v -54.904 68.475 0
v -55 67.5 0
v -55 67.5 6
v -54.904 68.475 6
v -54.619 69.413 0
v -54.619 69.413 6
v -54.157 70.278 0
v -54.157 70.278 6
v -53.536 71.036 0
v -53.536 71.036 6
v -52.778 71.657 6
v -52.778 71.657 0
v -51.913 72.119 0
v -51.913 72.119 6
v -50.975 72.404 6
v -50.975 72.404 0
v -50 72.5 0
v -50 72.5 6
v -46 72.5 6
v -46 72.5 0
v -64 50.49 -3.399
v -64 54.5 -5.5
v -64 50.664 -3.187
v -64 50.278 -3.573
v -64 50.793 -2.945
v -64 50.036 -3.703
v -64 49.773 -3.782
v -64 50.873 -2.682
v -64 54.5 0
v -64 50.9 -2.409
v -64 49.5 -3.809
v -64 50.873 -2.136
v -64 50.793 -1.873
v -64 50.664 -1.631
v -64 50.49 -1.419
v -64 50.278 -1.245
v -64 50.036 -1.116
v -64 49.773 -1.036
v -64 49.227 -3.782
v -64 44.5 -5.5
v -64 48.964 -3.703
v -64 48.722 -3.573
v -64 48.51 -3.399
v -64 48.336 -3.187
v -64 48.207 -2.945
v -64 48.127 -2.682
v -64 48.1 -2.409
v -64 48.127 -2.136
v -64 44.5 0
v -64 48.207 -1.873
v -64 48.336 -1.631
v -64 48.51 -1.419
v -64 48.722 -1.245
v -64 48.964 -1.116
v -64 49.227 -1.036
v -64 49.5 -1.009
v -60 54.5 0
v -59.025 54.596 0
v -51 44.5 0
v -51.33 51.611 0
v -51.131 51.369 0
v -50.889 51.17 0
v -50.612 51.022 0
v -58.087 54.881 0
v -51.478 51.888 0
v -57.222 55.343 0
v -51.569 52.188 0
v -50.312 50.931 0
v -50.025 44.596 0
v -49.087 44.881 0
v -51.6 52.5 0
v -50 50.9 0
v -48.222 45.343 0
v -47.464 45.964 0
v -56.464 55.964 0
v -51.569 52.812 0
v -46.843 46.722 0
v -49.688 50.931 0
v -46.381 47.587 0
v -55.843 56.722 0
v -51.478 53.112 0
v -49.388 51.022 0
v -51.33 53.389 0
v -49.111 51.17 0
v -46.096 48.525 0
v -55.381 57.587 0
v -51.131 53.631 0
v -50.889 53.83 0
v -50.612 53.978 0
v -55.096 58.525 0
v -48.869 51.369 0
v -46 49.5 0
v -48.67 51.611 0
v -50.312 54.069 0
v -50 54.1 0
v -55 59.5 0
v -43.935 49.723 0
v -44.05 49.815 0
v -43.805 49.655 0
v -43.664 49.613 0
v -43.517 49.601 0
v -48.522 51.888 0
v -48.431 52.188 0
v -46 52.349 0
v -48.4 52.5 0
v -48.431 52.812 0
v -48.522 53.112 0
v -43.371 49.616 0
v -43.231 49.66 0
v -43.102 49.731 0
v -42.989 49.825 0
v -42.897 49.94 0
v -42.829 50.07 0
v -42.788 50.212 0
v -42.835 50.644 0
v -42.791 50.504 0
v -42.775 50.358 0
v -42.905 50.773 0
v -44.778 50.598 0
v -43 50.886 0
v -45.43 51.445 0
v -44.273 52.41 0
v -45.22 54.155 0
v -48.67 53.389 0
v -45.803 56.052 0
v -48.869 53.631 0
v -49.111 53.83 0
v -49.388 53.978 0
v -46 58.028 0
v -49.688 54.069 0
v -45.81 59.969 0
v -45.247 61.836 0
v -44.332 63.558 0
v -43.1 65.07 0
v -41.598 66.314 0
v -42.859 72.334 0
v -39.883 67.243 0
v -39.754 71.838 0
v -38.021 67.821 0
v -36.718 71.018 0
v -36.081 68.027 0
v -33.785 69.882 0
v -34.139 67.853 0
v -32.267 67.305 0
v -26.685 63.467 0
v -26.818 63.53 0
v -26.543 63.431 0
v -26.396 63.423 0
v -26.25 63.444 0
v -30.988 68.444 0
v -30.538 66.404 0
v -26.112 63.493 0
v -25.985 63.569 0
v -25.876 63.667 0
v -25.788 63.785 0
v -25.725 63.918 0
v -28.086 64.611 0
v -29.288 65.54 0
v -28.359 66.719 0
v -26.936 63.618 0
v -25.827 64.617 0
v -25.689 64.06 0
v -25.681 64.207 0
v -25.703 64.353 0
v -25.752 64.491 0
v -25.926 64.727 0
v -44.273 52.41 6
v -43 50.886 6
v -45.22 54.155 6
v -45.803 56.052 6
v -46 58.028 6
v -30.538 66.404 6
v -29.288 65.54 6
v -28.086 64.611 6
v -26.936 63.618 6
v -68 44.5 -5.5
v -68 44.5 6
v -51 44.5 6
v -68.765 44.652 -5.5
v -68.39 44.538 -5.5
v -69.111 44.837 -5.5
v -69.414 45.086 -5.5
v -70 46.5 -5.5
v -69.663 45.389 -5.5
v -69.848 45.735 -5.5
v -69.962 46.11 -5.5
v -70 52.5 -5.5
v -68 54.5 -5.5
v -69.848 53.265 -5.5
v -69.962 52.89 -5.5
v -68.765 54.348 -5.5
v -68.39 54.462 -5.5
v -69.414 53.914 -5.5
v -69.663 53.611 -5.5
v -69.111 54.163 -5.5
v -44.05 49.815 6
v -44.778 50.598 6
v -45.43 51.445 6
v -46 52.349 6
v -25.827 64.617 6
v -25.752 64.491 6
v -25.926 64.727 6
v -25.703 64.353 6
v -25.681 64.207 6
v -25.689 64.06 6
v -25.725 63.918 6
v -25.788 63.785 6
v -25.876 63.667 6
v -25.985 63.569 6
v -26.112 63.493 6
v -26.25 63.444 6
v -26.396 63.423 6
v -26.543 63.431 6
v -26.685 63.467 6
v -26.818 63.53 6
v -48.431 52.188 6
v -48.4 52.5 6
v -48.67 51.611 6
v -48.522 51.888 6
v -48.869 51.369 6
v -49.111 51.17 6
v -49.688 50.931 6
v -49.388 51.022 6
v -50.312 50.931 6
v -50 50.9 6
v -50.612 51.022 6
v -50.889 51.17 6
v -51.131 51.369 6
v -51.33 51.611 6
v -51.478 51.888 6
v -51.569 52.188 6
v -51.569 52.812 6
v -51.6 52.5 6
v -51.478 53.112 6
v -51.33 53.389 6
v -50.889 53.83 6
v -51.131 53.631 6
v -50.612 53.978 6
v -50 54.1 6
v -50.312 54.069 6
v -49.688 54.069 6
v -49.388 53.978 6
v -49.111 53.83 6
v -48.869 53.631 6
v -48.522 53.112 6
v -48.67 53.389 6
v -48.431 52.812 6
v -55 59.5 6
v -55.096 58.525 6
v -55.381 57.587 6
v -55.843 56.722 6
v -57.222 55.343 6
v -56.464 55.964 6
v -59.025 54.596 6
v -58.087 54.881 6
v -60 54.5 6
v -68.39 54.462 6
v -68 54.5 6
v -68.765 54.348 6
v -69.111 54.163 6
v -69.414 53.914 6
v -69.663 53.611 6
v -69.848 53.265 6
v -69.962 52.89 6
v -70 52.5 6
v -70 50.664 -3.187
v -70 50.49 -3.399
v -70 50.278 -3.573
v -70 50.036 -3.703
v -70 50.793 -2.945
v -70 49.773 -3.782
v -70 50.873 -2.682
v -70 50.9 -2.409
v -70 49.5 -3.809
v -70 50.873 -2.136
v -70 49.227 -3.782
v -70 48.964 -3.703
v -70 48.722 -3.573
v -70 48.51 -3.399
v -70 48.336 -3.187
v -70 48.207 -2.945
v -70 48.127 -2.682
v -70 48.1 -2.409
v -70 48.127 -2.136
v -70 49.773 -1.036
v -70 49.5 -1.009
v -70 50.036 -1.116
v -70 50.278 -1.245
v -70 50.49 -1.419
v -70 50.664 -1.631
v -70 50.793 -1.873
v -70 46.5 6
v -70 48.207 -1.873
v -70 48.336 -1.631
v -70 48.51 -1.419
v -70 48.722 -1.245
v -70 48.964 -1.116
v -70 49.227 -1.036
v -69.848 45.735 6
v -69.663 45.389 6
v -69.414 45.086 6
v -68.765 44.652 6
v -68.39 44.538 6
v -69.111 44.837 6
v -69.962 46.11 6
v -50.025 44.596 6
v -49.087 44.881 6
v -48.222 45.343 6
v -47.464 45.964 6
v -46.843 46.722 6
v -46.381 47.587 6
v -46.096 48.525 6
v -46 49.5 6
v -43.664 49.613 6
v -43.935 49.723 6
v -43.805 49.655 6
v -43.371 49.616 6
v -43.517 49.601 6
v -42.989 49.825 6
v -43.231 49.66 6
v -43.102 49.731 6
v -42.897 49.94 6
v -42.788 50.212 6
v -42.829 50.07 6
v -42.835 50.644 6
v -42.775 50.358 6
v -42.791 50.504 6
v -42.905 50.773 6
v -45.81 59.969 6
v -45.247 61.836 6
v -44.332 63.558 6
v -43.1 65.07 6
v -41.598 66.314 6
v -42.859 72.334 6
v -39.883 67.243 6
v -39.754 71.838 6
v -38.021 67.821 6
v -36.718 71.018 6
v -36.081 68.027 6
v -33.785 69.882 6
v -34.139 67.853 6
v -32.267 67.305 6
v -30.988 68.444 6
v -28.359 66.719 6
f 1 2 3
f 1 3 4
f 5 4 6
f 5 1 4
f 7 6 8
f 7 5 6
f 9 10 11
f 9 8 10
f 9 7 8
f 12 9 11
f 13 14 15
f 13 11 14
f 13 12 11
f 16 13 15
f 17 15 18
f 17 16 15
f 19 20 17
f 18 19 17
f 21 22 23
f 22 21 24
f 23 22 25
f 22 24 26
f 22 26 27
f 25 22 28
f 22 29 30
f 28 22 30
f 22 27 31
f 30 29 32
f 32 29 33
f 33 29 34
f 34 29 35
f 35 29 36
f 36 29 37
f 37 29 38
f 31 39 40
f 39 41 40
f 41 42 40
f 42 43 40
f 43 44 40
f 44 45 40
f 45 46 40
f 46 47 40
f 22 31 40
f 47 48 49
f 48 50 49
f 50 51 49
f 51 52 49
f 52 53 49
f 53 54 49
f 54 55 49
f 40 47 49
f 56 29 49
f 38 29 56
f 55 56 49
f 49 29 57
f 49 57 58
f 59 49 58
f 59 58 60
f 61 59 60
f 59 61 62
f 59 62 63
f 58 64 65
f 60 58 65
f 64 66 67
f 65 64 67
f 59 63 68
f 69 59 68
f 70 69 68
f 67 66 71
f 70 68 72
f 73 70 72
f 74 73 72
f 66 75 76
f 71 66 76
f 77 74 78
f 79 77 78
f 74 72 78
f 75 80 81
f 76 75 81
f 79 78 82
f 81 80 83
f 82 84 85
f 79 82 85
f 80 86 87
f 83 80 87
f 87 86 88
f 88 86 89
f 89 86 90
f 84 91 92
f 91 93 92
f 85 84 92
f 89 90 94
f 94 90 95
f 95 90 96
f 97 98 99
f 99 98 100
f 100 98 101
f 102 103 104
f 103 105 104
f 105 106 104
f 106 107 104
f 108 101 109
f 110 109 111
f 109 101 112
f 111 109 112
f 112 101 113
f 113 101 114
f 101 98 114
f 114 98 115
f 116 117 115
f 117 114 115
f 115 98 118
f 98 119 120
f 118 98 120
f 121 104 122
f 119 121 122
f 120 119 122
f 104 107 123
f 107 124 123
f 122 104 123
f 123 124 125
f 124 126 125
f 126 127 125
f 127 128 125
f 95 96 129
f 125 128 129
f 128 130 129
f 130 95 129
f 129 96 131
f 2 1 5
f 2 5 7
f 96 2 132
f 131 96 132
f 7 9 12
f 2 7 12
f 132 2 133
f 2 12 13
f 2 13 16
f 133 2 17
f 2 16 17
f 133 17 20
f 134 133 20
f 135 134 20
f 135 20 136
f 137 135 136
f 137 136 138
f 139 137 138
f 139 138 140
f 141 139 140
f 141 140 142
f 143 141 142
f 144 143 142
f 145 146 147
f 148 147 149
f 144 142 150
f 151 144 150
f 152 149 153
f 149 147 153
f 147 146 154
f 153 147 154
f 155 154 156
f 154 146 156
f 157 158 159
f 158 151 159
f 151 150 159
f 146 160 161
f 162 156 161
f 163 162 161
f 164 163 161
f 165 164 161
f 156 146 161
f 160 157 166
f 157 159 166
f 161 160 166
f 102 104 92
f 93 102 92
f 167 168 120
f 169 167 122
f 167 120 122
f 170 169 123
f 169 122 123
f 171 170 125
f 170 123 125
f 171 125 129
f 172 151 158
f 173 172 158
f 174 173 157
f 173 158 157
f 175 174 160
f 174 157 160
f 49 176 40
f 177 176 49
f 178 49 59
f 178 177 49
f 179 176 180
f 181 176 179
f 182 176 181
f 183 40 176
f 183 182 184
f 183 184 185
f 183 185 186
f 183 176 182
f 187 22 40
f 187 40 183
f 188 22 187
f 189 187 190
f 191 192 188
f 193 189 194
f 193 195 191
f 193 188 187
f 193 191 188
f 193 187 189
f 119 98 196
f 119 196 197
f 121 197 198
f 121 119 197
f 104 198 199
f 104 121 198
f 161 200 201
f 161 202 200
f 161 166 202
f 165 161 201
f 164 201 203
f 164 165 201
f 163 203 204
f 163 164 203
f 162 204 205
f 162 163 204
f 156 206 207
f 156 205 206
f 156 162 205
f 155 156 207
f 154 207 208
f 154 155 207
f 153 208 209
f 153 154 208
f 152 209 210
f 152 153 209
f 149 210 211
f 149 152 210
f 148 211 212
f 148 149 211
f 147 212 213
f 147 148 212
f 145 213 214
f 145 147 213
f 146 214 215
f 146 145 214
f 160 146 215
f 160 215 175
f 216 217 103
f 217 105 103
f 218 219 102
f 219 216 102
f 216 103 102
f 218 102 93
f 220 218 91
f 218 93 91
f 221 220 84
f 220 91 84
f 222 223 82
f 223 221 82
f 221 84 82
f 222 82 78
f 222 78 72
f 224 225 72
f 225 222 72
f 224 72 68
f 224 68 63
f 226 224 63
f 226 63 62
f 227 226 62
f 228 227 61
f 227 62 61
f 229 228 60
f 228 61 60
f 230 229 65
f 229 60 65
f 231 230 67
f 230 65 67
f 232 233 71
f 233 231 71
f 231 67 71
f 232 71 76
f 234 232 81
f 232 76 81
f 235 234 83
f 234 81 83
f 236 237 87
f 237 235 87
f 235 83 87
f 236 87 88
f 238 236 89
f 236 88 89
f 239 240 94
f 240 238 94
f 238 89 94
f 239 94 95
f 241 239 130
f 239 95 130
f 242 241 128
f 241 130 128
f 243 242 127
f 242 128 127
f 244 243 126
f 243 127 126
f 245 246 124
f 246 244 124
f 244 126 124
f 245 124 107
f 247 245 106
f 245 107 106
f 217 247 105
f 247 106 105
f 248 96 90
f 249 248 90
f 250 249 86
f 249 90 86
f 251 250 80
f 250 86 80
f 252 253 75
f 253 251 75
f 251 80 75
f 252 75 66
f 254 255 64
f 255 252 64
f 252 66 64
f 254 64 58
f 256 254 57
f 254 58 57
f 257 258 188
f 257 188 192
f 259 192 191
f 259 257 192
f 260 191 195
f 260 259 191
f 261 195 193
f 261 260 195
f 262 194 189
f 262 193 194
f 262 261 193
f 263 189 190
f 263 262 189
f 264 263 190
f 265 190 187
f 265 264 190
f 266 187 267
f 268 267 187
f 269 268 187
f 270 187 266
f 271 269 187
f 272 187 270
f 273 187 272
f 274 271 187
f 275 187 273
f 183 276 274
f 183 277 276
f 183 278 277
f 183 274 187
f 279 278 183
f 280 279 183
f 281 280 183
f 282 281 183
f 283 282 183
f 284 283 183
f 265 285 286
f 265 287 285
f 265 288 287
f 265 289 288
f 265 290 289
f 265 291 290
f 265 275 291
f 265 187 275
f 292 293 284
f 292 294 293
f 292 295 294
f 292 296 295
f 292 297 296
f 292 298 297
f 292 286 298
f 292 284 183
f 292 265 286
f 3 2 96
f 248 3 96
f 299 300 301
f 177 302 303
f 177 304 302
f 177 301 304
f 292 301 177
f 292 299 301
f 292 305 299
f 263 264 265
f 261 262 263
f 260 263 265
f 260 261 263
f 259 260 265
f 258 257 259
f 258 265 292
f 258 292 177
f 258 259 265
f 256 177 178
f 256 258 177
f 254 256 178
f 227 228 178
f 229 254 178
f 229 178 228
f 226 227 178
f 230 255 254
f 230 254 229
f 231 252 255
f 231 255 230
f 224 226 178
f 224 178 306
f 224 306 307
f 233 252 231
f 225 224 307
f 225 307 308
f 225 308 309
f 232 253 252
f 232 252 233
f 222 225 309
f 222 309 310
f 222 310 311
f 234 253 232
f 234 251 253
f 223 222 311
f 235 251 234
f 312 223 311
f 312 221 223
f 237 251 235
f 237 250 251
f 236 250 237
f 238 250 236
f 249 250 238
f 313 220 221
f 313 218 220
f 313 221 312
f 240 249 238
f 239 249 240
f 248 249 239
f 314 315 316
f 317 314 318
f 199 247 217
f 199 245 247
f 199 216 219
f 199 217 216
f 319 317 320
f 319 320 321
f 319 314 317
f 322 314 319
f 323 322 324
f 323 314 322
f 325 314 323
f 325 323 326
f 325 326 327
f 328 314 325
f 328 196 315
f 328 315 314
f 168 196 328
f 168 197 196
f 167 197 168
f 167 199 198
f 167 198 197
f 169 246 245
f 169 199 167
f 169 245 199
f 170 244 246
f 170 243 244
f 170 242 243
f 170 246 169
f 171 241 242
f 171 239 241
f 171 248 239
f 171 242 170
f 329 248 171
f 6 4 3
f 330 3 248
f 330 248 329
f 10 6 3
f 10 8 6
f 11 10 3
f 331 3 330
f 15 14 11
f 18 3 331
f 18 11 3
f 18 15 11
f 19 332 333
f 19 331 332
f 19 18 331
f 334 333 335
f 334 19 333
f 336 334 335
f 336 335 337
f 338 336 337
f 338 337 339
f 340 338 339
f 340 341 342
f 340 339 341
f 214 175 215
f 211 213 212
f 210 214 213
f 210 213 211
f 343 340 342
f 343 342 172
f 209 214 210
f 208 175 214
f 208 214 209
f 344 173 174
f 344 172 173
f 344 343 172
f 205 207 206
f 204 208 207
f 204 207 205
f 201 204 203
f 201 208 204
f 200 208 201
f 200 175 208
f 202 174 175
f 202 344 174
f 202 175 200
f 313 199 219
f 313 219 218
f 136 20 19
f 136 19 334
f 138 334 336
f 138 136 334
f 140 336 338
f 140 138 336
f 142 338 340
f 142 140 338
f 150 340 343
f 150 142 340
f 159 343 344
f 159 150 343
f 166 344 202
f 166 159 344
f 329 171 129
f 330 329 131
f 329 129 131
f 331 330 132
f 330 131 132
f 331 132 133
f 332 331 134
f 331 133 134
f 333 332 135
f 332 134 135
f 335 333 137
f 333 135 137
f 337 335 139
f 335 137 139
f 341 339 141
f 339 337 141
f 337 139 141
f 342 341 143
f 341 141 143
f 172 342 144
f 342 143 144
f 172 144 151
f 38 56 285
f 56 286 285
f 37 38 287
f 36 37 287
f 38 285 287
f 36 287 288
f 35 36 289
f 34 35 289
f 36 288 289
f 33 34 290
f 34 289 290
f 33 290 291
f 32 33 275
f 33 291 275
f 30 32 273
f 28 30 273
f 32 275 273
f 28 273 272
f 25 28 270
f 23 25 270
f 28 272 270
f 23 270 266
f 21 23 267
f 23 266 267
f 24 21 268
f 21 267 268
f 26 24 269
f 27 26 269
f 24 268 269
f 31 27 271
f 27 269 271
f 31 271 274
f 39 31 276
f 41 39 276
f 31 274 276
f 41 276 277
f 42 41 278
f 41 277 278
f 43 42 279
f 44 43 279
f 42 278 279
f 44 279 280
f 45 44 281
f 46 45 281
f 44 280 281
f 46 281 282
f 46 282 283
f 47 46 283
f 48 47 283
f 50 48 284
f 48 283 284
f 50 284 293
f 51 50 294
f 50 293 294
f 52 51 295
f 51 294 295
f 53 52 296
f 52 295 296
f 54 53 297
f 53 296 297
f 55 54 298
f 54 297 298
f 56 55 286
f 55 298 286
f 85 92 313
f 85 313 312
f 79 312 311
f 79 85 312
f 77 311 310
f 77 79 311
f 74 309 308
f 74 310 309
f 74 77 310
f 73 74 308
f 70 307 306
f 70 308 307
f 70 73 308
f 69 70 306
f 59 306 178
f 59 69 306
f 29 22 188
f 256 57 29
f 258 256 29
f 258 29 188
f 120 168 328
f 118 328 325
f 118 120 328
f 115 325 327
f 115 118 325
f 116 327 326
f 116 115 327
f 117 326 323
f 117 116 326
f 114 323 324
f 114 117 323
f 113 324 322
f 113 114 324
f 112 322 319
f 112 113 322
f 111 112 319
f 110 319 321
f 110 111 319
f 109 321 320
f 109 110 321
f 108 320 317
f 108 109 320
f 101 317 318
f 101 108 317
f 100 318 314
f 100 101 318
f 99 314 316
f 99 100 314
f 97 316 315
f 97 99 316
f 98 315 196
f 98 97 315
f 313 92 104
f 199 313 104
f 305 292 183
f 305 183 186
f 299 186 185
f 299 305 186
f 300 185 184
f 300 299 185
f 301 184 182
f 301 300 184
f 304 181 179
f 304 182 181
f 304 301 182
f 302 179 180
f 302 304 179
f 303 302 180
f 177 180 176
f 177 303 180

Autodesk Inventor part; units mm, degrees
ref_plane "YZ Plane" through (0, 0, 0) normal (1, 0, 0) x (0, 1, 0)
ref_plane "XZ Plane" through (0, 0, 0) normal (0, 1, 0) x (-1, 0, 0)
ref_plane "XY Plane" through (0, 0, 0) normal (0, 0, 1) x (1, 0, 0)
ref_plane "Arbeitsebene1" through (0, 0, 0) normal (0, 0, 1) x (1, 0, 0)
sketch "Skizze1" plane through (0, 0, 0) normal (0, 0, 1) x (1, 0, 0)
  line L0 (-43.5249, 65.0249) -> (-30, 65.0249) projected
  line L1 (-43.5249, -65.0249) -> (-43.5249, 65.0249) projected
  circle A0 centre (-50, 52.5) radius 1.4 projected
  line L2 (-46, 72.5) -> (-50, 72.5)
  line L3 (-55, 67.5) -> (-55, 59.5)
  line L4 (-55, 44.5) -> (-51, 44.5)
  line L5 (-46, 49.5) -> (-46, 58.0276)
  line L6 (-55, 44.5) -> (-70, 44.5)
  line L7 (-70, 44.5) -> (-70, 54.5)
  line L8 (-70, 54.5) -> (-60, 54.5)
  line L9 (-55, 54.5) -> (-55, 44.5)
  circle A1 centre (-50, 52.5) radius 1.6
  arc A2 (-25.9255, 64.7266) -> (-46, 72.5) centre (-46, 42.6923) ccw
  arc A3 (-26.9357, 63.6178) -> (-30.5378, 66.404) centre (-46, 42.6923) ccw
  arc A4 (-30.5378, 66.404) -> (-46, 58.0276) centre (-36, 58.0276) ccw
  arc A5 (-26.9357, 63.6178) -> (-25.9255, 64.7266) centre (-26.4306, 64.1722) ccw
  arc A6 (-46, 58.0276) -> (-42.9999, 50.8861) centre (-36, 58.0276) ccw
  arc A7 (-46, 52.3487) -> (-44.0499, 49.8149) centre (-36, 58.0276) ccw
  arc A8 (-44.0499, 49.8149) -> (-42.9999, 50.8861) centre (-43.5249, 50.3505) ccw
  arc A9 (-51, 44.5) -> (-46, 49.5) centre (-51, 49.5) ccw
  arc A10 (-60, 54.5) -> (-55, 59.5) centre (-60, 59.5) ccw
  arc A11 (-50, 72.5) -> (-55, 67.5) centre (-50, 67.5) ccw
  point P0 (0, 0)
  point P1 (-55, 72.5)
  point P2 (-46, 44.5)
  point P3 (-27.3644, 64.0006)
  point P4 (-46, 71)
  dimension "d0" = 4
  dimension "d1" = 5
  dimension "d2" = 8
  dimension "d3" = 10
  dimension "d4" = 15
  dimension "d5" = 20
  dimension "d6" = 3.2
  dimension "d10" = 1.5
  dimension "d12" = 10
  dimension "d13" = 0.75
  dimension "d14" = 1.5
  dimension "d15" = 5
extrude "Extrusion1" add sketch "Skizze1" along normal blind 6 contours L1 A4 L5 A9 L4 L6 L7 L8 A10 L3 A11 L2 A2 A5 A3 L0 | L0 A4 L1 | A6 A8 L1 | L1 A8 A7 L5 A6
fillet "Rundung1" radius 2 3 edges at (-70, 54.5, 3) (-70, 44.5, 3) (-46, 72.5, 3)
sketch "Skizze2" plane through (0, 0, 0) normal (0, 0, -1) x (-1, 0, 0)
  line L0 (70, 52.5) -> (70, 46.5) projected
  arc A0 (68, 44.5) -> (70, 46.5) centre (68, 46.5) ccw projected
  line L1 (68, 44.5) -> (51, 44.5) projected
  arc A1 (46, 49.5) -> (51, 44.5) centre (51, 49.5) ccw projected
  line L2 (46, 49.5) -> (46, 52.3487) projected
  arc A2 (44.0499, 49.8149) -> (46, 52.3487) centre (36, 58.0276) ccw projected
  arc A3 (42.9999, 50.8861) -> (44.0499, 49.8149) centre (43.5249, 50.3505) ccw projected
  arc A4 (42.9999, 50.8861) -> (30.5378, 66.404) centre (36, 58.0276) ccw projected
  arc A5 (30.5378, 66.404) -> (26.9357, 63.6178) centre (46, 42.6923) ccw projected
  arc A6 (25.9255, 64.7266) -> (26.9357, 63.6178) centre (26.4306, 64.1722) ccw projected
  arc A7 (46, 72.5) -> (25.9255, 64.7266) centre (46, 42.6923) ccw projected
  line L3 (46, 72.5) -> (50, 72.5) projected
  arc A8 (55, 67.5) -> (50, 72.5) centre (50, 67.5) ccw projected
  line L4 (55, 67.5) -> (55, 59.5) projected
  arc A9 (55, 59.5) -> (60, 54.5) centre (60, 59.5) ccw projected
  line L5 (60, 54.5) -> (68, 54.5) projected
  arc A10 (70, 52.5) -> (68, 54.5) centre (68, 52.5) ccw projected
  line L6 (70, 52.5) -> (70, 46.5) projected
  circle A11 centre (50, 52.5) radius 1.6 projected
  line L7 (64, 54.5) -> (64, 44.5)
  point P0 (0, 0)
  dimension "d16" = 6
extrude "Extrusion2" add sketch "Skizze2" along normal blind 5.5 contours L0 A0 L1 L7 L5 A10
sketch "Skizze3" plane through (-70, 46.5, 6) normal (-1, 0, 0) x (0, 0, 1)
  line L0 (0, 0) -> (-11.5, 0) projected
  line L1 (0, 6) -> (0, 0) projected
  line L2 (0, 6) -> (-11.5, 6) projected
  line L3 (-11.5, 0) -> (-11.5, 6) projected
  circle A0 centre (-8.4091, 3) radius 1.4
  point P0 (-6, -46.5)
  dimension "d19" = 2.8
extrude "Extrusion3" cut sketch "Skizze3" against normal through all contours A0
properties part number "30_xystage_gp-010b_adapter_multiwellplate_flexureclamp"
